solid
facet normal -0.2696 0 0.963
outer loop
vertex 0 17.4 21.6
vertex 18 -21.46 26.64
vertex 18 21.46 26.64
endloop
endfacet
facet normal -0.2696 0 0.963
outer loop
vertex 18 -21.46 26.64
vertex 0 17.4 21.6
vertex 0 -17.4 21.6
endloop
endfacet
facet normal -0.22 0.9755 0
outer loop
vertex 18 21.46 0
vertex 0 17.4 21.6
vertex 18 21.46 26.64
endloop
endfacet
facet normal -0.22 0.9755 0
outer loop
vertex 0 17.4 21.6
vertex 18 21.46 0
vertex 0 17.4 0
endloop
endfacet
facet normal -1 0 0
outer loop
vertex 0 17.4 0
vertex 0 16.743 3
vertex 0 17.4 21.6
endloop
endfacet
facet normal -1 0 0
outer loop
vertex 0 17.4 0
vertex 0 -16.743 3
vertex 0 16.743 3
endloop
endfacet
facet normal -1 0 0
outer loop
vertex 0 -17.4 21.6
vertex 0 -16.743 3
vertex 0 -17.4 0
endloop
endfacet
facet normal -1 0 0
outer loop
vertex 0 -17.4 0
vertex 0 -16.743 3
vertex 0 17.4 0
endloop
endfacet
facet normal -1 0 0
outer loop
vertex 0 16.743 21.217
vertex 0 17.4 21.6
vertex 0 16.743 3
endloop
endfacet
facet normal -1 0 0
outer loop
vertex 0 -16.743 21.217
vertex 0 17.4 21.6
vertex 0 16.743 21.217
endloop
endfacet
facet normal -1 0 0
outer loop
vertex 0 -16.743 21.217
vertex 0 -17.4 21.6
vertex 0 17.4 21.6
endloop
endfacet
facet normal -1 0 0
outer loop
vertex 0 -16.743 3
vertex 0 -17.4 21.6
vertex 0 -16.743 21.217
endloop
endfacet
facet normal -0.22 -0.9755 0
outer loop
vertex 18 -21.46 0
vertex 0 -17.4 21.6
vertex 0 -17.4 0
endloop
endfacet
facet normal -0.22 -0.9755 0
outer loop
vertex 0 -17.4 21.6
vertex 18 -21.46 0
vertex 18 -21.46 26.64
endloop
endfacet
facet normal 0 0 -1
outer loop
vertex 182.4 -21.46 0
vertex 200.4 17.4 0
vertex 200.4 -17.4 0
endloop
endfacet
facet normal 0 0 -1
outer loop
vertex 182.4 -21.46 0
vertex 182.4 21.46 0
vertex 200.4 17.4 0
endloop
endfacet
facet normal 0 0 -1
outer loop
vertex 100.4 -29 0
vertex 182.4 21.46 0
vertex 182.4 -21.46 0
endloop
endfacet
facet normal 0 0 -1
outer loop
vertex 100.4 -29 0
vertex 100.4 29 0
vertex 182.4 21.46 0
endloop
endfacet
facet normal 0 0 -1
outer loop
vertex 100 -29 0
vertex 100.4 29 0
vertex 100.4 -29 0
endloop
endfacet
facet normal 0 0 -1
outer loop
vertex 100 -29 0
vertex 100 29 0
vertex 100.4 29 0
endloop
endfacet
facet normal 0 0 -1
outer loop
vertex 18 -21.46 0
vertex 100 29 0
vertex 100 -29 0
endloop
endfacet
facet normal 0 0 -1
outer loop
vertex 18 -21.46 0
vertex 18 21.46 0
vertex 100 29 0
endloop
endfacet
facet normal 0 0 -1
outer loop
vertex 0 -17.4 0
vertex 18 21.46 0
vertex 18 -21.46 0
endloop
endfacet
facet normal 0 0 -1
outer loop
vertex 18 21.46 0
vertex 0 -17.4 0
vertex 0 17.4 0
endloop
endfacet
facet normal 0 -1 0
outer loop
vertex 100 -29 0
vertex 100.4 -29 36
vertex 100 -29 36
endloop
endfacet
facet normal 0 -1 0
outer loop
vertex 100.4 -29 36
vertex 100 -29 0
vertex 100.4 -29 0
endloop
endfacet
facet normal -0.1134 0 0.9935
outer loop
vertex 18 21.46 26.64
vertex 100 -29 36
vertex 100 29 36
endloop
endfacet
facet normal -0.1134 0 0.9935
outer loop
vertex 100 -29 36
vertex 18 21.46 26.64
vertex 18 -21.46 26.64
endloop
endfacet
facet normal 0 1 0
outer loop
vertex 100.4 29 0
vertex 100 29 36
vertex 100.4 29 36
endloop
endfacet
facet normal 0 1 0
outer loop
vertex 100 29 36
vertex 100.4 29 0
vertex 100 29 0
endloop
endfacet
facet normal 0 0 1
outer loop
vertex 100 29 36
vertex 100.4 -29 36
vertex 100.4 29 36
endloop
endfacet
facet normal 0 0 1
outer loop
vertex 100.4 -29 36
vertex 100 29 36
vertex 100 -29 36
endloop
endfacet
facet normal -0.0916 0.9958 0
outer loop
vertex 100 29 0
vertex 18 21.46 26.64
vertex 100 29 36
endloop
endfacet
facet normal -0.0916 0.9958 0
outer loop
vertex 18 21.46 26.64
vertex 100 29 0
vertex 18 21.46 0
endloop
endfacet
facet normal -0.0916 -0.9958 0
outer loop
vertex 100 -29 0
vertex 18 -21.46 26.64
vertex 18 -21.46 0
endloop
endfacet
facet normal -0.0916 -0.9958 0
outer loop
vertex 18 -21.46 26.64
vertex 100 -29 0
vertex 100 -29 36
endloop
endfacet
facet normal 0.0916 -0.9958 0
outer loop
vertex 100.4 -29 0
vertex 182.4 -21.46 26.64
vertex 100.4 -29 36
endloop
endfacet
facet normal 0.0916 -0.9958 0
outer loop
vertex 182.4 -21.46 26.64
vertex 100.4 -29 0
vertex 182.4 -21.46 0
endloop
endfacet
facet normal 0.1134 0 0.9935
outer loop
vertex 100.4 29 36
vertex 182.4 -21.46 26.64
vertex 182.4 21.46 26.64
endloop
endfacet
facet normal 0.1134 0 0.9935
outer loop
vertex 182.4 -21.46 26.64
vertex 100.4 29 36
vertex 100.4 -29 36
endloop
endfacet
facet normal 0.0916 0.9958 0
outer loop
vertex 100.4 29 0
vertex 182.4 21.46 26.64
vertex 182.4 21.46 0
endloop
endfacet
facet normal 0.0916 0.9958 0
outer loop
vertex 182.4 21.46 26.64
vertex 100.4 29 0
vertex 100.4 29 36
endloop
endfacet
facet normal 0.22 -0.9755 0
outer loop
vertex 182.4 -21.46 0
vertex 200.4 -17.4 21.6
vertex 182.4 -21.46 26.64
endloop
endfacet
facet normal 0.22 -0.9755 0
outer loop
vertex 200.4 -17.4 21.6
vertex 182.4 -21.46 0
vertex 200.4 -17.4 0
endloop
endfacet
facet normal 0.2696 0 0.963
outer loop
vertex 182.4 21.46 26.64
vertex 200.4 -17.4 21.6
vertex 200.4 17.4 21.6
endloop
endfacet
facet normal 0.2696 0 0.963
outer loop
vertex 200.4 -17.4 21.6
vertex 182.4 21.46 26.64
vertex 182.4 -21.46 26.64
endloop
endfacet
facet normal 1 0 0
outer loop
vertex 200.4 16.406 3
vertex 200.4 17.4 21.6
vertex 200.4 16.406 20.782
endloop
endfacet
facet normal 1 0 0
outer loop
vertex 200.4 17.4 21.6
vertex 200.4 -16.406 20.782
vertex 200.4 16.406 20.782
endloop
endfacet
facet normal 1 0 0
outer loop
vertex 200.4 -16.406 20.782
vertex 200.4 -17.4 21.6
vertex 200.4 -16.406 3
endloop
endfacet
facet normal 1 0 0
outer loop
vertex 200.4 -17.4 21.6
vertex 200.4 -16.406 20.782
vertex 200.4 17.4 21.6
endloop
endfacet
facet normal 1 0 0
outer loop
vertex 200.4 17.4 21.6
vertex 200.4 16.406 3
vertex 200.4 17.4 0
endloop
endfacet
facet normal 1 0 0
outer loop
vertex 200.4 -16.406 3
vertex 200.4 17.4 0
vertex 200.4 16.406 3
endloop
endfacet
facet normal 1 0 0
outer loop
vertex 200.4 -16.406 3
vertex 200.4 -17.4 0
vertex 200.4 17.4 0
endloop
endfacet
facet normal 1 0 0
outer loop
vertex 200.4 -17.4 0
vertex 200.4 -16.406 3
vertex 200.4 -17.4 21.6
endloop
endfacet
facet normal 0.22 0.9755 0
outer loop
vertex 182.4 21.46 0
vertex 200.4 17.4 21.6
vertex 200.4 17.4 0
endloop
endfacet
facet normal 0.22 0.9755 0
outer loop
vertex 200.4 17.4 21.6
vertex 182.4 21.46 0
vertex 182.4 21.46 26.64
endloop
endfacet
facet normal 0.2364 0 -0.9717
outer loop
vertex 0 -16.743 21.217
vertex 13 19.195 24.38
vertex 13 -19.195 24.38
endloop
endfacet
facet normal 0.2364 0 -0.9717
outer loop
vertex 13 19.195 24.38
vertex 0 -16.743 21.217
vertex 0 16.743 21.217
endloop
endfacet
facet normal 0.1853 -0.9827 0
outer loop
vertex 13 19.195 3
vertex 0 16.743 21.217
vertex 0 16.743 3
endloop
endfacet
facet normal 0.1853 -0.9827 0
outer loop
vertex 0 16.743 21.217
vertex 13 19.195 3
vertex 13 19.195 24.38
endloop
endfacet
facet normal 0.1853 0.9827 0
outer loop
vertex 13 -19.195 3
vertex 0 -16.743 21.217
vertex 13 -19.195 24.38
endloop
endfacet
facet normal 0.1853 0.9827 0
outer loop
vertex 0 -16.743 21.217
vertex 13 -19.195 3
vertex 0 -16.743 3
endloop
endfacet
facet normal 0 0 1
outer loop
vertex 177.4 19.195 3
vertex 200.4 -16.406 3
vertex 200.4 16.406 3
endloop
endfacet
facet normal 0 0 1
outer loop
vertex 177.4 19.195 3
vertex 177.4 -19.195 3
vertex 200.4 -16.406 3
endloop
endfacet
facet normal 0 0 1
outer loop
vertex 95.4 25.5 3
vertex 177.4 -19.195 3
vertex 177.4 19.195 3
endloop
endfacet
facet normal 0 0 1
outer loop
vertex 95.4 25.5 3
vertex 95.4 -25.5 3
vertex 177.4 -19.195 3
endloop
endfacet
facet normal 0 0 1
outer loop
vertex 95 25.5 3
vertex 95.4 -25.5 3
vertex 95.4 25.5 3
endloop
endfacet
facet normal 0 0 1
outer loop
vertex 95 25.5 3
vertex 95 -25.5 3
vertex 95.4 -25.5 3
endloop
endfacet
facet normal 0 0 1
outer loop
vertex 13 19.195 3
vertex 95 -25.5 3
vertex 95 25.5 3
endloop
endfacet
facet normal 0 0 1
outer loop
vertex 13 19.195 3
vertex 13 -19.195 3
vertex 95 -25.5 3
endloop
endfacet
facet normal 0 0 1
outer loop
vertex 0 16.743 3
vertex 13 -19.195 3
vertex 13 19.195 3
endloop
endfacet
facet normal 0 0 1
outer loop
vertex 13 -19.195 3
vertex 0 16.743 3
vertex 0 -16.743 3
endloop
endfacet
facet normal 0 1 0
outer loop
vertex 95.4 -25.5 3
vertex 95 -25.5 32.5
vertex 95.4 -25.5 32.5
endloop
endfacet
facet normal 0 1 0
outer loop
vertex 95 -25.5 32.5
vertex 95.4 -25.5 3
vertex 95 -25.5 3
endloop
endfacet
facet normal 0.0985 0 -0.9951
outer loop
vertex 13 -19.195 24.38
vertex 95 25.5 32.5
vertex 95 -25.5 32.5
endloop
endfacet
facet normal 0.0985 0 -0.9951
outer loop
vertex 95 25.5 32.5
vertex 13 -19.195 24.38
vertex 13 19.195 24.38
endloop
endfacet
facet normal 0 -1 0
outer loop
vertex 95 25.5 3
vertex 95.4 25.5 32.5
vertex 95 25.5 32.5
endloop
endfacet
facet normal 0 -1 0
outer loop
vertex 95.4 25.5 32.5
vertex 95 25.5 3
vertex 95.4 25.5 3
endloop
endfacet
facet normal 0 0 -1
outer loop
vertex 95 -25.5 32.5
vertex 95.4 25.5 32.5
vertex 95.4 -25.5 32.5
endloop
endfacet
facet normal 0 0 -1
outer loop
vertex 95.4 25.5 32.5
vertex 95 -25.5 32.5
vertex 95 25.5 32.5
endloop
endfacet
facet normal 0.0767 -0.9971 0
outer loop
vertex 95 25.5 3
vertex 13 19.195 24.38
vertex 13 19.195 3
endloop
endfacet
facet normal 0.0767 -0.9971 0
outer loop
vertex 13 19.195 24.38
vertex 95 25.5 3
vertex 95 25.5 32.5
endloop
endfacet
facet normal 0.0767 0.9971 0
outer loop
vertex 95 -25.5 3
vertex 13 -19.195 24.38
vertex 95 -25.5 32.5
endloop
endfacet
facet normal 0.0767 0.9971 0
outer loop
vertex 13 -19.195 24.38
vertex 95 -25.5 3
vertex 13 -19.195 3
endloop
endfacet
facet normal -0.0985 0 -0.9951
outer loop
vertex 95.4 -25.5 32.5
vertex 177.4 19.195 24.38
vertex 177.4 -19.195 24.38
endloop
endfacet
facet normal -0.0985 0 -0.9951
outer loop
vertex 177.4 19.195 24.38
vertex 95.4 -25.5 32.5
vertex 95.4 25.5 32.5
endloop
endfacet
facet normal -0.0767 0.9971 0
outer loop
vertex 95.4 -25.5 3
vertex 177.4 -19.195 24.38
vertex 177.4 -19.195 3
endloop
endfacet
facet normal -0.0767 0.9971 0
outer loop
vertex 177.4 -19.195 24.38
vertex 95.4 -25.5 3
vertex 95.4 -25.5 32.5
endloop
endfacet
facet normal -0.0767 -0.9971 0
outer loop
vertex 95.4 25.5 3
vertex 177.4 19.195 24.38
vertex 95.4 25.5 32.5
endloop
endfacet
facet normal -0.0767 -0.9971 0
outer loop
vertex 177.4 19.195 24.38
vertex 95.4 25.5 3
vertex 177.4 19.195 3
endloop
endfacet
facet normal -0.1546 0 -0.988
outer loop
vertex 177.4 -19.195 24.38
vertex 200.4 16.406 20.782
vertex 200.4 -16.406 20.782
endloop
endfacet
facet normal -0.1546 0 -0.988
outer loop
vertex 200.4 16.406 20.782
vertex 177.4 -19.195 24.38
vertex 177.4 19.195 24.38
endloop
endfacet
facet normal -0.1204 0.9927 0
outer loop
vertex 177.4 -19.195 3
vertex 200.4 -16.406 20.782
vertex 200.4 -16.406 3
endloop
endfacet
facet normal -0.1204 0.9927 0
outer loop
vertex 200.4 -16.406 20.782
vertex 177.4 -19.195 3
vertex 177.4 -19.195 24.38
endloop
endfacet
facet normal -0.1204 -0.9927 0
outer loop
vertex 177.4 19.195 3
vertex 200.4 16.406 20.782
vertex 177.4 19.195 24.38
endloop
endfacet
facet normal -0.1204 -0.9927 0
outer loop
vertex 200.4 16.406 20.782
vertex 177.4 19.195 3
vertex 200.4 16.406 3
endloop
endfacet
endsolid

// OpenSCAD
$fn = 32;

// ----------------------------------------------------------------------
// Faired channel: 200 x 58 x 36 mm, 3.5 mm walls, faired ends
// ----------------------------------------------------------------------

// --- parameters (mm) ---
length = 200;             // channel length
width = 58;               // channel width at mid length
height = 36;              // channel height at mid length
wall = 3.5;               // side wall thickness
floor_t = 3;              // floor thickness
end_w = 34.8;             // faired end width
end_h = 21.6;             // faired end height

difference() {
  union() {
    hull() {
      translate([0, -17.4, 0]) cube([0.4, 34.8, 21.6]);
      translate([18, -21.46, 0]) cube([0.4, 42.92, 26.64]);
    }
    hull() {
      translate([18, -21.46, 0]) cube([0.4, 42.92, 26.64]);
      translate([100, -29, 0]) cube([0.4, 58, 36]);
    }
    hull() {
      translate([100, -29, 0]) cube([0.4, 58, 36]);
      translate([182, -21.46, 0]) cube([0.4, 42.92, 26.64]);
    }
    hull() {
      translate([182, -21.46, 0]) cube([0.4, 42.92, 26.64]);
      translate([200, -17.4, 0]) cube([0.4, 34.8, 21.6]);
    }
  }
  /* cavity, 5 mm proud of both ends so the ports are cut clean */
  hull() {
    translate([-5, -15.8, 3]) cube([0.4, 31.6, 17]);
    translate([13, -19.195, 3]) cube([0.4, 38.39, 21.38]);
  }
  hull() {
    translate([13, -19.195, 3]) cube([0.4, 38.39, 21.38]);
    translate([95, -25.5, 3]) cube([0.4, 51, 29.5]);
  }
  hull() {
    translate([95, -25.5, 3]) cube([0.4, 51, 29.5]);
    translate([177, -19.195, 3]) cube([0.4, 38.39, 21.38]);
  }
  hull() {
    translate([177, -19.195, 3]) cube([0.4, 38.39, 21.38]);
    translate([205, -15.8, 3]) cube([0.4, 31.6, 17]);
  }
}
